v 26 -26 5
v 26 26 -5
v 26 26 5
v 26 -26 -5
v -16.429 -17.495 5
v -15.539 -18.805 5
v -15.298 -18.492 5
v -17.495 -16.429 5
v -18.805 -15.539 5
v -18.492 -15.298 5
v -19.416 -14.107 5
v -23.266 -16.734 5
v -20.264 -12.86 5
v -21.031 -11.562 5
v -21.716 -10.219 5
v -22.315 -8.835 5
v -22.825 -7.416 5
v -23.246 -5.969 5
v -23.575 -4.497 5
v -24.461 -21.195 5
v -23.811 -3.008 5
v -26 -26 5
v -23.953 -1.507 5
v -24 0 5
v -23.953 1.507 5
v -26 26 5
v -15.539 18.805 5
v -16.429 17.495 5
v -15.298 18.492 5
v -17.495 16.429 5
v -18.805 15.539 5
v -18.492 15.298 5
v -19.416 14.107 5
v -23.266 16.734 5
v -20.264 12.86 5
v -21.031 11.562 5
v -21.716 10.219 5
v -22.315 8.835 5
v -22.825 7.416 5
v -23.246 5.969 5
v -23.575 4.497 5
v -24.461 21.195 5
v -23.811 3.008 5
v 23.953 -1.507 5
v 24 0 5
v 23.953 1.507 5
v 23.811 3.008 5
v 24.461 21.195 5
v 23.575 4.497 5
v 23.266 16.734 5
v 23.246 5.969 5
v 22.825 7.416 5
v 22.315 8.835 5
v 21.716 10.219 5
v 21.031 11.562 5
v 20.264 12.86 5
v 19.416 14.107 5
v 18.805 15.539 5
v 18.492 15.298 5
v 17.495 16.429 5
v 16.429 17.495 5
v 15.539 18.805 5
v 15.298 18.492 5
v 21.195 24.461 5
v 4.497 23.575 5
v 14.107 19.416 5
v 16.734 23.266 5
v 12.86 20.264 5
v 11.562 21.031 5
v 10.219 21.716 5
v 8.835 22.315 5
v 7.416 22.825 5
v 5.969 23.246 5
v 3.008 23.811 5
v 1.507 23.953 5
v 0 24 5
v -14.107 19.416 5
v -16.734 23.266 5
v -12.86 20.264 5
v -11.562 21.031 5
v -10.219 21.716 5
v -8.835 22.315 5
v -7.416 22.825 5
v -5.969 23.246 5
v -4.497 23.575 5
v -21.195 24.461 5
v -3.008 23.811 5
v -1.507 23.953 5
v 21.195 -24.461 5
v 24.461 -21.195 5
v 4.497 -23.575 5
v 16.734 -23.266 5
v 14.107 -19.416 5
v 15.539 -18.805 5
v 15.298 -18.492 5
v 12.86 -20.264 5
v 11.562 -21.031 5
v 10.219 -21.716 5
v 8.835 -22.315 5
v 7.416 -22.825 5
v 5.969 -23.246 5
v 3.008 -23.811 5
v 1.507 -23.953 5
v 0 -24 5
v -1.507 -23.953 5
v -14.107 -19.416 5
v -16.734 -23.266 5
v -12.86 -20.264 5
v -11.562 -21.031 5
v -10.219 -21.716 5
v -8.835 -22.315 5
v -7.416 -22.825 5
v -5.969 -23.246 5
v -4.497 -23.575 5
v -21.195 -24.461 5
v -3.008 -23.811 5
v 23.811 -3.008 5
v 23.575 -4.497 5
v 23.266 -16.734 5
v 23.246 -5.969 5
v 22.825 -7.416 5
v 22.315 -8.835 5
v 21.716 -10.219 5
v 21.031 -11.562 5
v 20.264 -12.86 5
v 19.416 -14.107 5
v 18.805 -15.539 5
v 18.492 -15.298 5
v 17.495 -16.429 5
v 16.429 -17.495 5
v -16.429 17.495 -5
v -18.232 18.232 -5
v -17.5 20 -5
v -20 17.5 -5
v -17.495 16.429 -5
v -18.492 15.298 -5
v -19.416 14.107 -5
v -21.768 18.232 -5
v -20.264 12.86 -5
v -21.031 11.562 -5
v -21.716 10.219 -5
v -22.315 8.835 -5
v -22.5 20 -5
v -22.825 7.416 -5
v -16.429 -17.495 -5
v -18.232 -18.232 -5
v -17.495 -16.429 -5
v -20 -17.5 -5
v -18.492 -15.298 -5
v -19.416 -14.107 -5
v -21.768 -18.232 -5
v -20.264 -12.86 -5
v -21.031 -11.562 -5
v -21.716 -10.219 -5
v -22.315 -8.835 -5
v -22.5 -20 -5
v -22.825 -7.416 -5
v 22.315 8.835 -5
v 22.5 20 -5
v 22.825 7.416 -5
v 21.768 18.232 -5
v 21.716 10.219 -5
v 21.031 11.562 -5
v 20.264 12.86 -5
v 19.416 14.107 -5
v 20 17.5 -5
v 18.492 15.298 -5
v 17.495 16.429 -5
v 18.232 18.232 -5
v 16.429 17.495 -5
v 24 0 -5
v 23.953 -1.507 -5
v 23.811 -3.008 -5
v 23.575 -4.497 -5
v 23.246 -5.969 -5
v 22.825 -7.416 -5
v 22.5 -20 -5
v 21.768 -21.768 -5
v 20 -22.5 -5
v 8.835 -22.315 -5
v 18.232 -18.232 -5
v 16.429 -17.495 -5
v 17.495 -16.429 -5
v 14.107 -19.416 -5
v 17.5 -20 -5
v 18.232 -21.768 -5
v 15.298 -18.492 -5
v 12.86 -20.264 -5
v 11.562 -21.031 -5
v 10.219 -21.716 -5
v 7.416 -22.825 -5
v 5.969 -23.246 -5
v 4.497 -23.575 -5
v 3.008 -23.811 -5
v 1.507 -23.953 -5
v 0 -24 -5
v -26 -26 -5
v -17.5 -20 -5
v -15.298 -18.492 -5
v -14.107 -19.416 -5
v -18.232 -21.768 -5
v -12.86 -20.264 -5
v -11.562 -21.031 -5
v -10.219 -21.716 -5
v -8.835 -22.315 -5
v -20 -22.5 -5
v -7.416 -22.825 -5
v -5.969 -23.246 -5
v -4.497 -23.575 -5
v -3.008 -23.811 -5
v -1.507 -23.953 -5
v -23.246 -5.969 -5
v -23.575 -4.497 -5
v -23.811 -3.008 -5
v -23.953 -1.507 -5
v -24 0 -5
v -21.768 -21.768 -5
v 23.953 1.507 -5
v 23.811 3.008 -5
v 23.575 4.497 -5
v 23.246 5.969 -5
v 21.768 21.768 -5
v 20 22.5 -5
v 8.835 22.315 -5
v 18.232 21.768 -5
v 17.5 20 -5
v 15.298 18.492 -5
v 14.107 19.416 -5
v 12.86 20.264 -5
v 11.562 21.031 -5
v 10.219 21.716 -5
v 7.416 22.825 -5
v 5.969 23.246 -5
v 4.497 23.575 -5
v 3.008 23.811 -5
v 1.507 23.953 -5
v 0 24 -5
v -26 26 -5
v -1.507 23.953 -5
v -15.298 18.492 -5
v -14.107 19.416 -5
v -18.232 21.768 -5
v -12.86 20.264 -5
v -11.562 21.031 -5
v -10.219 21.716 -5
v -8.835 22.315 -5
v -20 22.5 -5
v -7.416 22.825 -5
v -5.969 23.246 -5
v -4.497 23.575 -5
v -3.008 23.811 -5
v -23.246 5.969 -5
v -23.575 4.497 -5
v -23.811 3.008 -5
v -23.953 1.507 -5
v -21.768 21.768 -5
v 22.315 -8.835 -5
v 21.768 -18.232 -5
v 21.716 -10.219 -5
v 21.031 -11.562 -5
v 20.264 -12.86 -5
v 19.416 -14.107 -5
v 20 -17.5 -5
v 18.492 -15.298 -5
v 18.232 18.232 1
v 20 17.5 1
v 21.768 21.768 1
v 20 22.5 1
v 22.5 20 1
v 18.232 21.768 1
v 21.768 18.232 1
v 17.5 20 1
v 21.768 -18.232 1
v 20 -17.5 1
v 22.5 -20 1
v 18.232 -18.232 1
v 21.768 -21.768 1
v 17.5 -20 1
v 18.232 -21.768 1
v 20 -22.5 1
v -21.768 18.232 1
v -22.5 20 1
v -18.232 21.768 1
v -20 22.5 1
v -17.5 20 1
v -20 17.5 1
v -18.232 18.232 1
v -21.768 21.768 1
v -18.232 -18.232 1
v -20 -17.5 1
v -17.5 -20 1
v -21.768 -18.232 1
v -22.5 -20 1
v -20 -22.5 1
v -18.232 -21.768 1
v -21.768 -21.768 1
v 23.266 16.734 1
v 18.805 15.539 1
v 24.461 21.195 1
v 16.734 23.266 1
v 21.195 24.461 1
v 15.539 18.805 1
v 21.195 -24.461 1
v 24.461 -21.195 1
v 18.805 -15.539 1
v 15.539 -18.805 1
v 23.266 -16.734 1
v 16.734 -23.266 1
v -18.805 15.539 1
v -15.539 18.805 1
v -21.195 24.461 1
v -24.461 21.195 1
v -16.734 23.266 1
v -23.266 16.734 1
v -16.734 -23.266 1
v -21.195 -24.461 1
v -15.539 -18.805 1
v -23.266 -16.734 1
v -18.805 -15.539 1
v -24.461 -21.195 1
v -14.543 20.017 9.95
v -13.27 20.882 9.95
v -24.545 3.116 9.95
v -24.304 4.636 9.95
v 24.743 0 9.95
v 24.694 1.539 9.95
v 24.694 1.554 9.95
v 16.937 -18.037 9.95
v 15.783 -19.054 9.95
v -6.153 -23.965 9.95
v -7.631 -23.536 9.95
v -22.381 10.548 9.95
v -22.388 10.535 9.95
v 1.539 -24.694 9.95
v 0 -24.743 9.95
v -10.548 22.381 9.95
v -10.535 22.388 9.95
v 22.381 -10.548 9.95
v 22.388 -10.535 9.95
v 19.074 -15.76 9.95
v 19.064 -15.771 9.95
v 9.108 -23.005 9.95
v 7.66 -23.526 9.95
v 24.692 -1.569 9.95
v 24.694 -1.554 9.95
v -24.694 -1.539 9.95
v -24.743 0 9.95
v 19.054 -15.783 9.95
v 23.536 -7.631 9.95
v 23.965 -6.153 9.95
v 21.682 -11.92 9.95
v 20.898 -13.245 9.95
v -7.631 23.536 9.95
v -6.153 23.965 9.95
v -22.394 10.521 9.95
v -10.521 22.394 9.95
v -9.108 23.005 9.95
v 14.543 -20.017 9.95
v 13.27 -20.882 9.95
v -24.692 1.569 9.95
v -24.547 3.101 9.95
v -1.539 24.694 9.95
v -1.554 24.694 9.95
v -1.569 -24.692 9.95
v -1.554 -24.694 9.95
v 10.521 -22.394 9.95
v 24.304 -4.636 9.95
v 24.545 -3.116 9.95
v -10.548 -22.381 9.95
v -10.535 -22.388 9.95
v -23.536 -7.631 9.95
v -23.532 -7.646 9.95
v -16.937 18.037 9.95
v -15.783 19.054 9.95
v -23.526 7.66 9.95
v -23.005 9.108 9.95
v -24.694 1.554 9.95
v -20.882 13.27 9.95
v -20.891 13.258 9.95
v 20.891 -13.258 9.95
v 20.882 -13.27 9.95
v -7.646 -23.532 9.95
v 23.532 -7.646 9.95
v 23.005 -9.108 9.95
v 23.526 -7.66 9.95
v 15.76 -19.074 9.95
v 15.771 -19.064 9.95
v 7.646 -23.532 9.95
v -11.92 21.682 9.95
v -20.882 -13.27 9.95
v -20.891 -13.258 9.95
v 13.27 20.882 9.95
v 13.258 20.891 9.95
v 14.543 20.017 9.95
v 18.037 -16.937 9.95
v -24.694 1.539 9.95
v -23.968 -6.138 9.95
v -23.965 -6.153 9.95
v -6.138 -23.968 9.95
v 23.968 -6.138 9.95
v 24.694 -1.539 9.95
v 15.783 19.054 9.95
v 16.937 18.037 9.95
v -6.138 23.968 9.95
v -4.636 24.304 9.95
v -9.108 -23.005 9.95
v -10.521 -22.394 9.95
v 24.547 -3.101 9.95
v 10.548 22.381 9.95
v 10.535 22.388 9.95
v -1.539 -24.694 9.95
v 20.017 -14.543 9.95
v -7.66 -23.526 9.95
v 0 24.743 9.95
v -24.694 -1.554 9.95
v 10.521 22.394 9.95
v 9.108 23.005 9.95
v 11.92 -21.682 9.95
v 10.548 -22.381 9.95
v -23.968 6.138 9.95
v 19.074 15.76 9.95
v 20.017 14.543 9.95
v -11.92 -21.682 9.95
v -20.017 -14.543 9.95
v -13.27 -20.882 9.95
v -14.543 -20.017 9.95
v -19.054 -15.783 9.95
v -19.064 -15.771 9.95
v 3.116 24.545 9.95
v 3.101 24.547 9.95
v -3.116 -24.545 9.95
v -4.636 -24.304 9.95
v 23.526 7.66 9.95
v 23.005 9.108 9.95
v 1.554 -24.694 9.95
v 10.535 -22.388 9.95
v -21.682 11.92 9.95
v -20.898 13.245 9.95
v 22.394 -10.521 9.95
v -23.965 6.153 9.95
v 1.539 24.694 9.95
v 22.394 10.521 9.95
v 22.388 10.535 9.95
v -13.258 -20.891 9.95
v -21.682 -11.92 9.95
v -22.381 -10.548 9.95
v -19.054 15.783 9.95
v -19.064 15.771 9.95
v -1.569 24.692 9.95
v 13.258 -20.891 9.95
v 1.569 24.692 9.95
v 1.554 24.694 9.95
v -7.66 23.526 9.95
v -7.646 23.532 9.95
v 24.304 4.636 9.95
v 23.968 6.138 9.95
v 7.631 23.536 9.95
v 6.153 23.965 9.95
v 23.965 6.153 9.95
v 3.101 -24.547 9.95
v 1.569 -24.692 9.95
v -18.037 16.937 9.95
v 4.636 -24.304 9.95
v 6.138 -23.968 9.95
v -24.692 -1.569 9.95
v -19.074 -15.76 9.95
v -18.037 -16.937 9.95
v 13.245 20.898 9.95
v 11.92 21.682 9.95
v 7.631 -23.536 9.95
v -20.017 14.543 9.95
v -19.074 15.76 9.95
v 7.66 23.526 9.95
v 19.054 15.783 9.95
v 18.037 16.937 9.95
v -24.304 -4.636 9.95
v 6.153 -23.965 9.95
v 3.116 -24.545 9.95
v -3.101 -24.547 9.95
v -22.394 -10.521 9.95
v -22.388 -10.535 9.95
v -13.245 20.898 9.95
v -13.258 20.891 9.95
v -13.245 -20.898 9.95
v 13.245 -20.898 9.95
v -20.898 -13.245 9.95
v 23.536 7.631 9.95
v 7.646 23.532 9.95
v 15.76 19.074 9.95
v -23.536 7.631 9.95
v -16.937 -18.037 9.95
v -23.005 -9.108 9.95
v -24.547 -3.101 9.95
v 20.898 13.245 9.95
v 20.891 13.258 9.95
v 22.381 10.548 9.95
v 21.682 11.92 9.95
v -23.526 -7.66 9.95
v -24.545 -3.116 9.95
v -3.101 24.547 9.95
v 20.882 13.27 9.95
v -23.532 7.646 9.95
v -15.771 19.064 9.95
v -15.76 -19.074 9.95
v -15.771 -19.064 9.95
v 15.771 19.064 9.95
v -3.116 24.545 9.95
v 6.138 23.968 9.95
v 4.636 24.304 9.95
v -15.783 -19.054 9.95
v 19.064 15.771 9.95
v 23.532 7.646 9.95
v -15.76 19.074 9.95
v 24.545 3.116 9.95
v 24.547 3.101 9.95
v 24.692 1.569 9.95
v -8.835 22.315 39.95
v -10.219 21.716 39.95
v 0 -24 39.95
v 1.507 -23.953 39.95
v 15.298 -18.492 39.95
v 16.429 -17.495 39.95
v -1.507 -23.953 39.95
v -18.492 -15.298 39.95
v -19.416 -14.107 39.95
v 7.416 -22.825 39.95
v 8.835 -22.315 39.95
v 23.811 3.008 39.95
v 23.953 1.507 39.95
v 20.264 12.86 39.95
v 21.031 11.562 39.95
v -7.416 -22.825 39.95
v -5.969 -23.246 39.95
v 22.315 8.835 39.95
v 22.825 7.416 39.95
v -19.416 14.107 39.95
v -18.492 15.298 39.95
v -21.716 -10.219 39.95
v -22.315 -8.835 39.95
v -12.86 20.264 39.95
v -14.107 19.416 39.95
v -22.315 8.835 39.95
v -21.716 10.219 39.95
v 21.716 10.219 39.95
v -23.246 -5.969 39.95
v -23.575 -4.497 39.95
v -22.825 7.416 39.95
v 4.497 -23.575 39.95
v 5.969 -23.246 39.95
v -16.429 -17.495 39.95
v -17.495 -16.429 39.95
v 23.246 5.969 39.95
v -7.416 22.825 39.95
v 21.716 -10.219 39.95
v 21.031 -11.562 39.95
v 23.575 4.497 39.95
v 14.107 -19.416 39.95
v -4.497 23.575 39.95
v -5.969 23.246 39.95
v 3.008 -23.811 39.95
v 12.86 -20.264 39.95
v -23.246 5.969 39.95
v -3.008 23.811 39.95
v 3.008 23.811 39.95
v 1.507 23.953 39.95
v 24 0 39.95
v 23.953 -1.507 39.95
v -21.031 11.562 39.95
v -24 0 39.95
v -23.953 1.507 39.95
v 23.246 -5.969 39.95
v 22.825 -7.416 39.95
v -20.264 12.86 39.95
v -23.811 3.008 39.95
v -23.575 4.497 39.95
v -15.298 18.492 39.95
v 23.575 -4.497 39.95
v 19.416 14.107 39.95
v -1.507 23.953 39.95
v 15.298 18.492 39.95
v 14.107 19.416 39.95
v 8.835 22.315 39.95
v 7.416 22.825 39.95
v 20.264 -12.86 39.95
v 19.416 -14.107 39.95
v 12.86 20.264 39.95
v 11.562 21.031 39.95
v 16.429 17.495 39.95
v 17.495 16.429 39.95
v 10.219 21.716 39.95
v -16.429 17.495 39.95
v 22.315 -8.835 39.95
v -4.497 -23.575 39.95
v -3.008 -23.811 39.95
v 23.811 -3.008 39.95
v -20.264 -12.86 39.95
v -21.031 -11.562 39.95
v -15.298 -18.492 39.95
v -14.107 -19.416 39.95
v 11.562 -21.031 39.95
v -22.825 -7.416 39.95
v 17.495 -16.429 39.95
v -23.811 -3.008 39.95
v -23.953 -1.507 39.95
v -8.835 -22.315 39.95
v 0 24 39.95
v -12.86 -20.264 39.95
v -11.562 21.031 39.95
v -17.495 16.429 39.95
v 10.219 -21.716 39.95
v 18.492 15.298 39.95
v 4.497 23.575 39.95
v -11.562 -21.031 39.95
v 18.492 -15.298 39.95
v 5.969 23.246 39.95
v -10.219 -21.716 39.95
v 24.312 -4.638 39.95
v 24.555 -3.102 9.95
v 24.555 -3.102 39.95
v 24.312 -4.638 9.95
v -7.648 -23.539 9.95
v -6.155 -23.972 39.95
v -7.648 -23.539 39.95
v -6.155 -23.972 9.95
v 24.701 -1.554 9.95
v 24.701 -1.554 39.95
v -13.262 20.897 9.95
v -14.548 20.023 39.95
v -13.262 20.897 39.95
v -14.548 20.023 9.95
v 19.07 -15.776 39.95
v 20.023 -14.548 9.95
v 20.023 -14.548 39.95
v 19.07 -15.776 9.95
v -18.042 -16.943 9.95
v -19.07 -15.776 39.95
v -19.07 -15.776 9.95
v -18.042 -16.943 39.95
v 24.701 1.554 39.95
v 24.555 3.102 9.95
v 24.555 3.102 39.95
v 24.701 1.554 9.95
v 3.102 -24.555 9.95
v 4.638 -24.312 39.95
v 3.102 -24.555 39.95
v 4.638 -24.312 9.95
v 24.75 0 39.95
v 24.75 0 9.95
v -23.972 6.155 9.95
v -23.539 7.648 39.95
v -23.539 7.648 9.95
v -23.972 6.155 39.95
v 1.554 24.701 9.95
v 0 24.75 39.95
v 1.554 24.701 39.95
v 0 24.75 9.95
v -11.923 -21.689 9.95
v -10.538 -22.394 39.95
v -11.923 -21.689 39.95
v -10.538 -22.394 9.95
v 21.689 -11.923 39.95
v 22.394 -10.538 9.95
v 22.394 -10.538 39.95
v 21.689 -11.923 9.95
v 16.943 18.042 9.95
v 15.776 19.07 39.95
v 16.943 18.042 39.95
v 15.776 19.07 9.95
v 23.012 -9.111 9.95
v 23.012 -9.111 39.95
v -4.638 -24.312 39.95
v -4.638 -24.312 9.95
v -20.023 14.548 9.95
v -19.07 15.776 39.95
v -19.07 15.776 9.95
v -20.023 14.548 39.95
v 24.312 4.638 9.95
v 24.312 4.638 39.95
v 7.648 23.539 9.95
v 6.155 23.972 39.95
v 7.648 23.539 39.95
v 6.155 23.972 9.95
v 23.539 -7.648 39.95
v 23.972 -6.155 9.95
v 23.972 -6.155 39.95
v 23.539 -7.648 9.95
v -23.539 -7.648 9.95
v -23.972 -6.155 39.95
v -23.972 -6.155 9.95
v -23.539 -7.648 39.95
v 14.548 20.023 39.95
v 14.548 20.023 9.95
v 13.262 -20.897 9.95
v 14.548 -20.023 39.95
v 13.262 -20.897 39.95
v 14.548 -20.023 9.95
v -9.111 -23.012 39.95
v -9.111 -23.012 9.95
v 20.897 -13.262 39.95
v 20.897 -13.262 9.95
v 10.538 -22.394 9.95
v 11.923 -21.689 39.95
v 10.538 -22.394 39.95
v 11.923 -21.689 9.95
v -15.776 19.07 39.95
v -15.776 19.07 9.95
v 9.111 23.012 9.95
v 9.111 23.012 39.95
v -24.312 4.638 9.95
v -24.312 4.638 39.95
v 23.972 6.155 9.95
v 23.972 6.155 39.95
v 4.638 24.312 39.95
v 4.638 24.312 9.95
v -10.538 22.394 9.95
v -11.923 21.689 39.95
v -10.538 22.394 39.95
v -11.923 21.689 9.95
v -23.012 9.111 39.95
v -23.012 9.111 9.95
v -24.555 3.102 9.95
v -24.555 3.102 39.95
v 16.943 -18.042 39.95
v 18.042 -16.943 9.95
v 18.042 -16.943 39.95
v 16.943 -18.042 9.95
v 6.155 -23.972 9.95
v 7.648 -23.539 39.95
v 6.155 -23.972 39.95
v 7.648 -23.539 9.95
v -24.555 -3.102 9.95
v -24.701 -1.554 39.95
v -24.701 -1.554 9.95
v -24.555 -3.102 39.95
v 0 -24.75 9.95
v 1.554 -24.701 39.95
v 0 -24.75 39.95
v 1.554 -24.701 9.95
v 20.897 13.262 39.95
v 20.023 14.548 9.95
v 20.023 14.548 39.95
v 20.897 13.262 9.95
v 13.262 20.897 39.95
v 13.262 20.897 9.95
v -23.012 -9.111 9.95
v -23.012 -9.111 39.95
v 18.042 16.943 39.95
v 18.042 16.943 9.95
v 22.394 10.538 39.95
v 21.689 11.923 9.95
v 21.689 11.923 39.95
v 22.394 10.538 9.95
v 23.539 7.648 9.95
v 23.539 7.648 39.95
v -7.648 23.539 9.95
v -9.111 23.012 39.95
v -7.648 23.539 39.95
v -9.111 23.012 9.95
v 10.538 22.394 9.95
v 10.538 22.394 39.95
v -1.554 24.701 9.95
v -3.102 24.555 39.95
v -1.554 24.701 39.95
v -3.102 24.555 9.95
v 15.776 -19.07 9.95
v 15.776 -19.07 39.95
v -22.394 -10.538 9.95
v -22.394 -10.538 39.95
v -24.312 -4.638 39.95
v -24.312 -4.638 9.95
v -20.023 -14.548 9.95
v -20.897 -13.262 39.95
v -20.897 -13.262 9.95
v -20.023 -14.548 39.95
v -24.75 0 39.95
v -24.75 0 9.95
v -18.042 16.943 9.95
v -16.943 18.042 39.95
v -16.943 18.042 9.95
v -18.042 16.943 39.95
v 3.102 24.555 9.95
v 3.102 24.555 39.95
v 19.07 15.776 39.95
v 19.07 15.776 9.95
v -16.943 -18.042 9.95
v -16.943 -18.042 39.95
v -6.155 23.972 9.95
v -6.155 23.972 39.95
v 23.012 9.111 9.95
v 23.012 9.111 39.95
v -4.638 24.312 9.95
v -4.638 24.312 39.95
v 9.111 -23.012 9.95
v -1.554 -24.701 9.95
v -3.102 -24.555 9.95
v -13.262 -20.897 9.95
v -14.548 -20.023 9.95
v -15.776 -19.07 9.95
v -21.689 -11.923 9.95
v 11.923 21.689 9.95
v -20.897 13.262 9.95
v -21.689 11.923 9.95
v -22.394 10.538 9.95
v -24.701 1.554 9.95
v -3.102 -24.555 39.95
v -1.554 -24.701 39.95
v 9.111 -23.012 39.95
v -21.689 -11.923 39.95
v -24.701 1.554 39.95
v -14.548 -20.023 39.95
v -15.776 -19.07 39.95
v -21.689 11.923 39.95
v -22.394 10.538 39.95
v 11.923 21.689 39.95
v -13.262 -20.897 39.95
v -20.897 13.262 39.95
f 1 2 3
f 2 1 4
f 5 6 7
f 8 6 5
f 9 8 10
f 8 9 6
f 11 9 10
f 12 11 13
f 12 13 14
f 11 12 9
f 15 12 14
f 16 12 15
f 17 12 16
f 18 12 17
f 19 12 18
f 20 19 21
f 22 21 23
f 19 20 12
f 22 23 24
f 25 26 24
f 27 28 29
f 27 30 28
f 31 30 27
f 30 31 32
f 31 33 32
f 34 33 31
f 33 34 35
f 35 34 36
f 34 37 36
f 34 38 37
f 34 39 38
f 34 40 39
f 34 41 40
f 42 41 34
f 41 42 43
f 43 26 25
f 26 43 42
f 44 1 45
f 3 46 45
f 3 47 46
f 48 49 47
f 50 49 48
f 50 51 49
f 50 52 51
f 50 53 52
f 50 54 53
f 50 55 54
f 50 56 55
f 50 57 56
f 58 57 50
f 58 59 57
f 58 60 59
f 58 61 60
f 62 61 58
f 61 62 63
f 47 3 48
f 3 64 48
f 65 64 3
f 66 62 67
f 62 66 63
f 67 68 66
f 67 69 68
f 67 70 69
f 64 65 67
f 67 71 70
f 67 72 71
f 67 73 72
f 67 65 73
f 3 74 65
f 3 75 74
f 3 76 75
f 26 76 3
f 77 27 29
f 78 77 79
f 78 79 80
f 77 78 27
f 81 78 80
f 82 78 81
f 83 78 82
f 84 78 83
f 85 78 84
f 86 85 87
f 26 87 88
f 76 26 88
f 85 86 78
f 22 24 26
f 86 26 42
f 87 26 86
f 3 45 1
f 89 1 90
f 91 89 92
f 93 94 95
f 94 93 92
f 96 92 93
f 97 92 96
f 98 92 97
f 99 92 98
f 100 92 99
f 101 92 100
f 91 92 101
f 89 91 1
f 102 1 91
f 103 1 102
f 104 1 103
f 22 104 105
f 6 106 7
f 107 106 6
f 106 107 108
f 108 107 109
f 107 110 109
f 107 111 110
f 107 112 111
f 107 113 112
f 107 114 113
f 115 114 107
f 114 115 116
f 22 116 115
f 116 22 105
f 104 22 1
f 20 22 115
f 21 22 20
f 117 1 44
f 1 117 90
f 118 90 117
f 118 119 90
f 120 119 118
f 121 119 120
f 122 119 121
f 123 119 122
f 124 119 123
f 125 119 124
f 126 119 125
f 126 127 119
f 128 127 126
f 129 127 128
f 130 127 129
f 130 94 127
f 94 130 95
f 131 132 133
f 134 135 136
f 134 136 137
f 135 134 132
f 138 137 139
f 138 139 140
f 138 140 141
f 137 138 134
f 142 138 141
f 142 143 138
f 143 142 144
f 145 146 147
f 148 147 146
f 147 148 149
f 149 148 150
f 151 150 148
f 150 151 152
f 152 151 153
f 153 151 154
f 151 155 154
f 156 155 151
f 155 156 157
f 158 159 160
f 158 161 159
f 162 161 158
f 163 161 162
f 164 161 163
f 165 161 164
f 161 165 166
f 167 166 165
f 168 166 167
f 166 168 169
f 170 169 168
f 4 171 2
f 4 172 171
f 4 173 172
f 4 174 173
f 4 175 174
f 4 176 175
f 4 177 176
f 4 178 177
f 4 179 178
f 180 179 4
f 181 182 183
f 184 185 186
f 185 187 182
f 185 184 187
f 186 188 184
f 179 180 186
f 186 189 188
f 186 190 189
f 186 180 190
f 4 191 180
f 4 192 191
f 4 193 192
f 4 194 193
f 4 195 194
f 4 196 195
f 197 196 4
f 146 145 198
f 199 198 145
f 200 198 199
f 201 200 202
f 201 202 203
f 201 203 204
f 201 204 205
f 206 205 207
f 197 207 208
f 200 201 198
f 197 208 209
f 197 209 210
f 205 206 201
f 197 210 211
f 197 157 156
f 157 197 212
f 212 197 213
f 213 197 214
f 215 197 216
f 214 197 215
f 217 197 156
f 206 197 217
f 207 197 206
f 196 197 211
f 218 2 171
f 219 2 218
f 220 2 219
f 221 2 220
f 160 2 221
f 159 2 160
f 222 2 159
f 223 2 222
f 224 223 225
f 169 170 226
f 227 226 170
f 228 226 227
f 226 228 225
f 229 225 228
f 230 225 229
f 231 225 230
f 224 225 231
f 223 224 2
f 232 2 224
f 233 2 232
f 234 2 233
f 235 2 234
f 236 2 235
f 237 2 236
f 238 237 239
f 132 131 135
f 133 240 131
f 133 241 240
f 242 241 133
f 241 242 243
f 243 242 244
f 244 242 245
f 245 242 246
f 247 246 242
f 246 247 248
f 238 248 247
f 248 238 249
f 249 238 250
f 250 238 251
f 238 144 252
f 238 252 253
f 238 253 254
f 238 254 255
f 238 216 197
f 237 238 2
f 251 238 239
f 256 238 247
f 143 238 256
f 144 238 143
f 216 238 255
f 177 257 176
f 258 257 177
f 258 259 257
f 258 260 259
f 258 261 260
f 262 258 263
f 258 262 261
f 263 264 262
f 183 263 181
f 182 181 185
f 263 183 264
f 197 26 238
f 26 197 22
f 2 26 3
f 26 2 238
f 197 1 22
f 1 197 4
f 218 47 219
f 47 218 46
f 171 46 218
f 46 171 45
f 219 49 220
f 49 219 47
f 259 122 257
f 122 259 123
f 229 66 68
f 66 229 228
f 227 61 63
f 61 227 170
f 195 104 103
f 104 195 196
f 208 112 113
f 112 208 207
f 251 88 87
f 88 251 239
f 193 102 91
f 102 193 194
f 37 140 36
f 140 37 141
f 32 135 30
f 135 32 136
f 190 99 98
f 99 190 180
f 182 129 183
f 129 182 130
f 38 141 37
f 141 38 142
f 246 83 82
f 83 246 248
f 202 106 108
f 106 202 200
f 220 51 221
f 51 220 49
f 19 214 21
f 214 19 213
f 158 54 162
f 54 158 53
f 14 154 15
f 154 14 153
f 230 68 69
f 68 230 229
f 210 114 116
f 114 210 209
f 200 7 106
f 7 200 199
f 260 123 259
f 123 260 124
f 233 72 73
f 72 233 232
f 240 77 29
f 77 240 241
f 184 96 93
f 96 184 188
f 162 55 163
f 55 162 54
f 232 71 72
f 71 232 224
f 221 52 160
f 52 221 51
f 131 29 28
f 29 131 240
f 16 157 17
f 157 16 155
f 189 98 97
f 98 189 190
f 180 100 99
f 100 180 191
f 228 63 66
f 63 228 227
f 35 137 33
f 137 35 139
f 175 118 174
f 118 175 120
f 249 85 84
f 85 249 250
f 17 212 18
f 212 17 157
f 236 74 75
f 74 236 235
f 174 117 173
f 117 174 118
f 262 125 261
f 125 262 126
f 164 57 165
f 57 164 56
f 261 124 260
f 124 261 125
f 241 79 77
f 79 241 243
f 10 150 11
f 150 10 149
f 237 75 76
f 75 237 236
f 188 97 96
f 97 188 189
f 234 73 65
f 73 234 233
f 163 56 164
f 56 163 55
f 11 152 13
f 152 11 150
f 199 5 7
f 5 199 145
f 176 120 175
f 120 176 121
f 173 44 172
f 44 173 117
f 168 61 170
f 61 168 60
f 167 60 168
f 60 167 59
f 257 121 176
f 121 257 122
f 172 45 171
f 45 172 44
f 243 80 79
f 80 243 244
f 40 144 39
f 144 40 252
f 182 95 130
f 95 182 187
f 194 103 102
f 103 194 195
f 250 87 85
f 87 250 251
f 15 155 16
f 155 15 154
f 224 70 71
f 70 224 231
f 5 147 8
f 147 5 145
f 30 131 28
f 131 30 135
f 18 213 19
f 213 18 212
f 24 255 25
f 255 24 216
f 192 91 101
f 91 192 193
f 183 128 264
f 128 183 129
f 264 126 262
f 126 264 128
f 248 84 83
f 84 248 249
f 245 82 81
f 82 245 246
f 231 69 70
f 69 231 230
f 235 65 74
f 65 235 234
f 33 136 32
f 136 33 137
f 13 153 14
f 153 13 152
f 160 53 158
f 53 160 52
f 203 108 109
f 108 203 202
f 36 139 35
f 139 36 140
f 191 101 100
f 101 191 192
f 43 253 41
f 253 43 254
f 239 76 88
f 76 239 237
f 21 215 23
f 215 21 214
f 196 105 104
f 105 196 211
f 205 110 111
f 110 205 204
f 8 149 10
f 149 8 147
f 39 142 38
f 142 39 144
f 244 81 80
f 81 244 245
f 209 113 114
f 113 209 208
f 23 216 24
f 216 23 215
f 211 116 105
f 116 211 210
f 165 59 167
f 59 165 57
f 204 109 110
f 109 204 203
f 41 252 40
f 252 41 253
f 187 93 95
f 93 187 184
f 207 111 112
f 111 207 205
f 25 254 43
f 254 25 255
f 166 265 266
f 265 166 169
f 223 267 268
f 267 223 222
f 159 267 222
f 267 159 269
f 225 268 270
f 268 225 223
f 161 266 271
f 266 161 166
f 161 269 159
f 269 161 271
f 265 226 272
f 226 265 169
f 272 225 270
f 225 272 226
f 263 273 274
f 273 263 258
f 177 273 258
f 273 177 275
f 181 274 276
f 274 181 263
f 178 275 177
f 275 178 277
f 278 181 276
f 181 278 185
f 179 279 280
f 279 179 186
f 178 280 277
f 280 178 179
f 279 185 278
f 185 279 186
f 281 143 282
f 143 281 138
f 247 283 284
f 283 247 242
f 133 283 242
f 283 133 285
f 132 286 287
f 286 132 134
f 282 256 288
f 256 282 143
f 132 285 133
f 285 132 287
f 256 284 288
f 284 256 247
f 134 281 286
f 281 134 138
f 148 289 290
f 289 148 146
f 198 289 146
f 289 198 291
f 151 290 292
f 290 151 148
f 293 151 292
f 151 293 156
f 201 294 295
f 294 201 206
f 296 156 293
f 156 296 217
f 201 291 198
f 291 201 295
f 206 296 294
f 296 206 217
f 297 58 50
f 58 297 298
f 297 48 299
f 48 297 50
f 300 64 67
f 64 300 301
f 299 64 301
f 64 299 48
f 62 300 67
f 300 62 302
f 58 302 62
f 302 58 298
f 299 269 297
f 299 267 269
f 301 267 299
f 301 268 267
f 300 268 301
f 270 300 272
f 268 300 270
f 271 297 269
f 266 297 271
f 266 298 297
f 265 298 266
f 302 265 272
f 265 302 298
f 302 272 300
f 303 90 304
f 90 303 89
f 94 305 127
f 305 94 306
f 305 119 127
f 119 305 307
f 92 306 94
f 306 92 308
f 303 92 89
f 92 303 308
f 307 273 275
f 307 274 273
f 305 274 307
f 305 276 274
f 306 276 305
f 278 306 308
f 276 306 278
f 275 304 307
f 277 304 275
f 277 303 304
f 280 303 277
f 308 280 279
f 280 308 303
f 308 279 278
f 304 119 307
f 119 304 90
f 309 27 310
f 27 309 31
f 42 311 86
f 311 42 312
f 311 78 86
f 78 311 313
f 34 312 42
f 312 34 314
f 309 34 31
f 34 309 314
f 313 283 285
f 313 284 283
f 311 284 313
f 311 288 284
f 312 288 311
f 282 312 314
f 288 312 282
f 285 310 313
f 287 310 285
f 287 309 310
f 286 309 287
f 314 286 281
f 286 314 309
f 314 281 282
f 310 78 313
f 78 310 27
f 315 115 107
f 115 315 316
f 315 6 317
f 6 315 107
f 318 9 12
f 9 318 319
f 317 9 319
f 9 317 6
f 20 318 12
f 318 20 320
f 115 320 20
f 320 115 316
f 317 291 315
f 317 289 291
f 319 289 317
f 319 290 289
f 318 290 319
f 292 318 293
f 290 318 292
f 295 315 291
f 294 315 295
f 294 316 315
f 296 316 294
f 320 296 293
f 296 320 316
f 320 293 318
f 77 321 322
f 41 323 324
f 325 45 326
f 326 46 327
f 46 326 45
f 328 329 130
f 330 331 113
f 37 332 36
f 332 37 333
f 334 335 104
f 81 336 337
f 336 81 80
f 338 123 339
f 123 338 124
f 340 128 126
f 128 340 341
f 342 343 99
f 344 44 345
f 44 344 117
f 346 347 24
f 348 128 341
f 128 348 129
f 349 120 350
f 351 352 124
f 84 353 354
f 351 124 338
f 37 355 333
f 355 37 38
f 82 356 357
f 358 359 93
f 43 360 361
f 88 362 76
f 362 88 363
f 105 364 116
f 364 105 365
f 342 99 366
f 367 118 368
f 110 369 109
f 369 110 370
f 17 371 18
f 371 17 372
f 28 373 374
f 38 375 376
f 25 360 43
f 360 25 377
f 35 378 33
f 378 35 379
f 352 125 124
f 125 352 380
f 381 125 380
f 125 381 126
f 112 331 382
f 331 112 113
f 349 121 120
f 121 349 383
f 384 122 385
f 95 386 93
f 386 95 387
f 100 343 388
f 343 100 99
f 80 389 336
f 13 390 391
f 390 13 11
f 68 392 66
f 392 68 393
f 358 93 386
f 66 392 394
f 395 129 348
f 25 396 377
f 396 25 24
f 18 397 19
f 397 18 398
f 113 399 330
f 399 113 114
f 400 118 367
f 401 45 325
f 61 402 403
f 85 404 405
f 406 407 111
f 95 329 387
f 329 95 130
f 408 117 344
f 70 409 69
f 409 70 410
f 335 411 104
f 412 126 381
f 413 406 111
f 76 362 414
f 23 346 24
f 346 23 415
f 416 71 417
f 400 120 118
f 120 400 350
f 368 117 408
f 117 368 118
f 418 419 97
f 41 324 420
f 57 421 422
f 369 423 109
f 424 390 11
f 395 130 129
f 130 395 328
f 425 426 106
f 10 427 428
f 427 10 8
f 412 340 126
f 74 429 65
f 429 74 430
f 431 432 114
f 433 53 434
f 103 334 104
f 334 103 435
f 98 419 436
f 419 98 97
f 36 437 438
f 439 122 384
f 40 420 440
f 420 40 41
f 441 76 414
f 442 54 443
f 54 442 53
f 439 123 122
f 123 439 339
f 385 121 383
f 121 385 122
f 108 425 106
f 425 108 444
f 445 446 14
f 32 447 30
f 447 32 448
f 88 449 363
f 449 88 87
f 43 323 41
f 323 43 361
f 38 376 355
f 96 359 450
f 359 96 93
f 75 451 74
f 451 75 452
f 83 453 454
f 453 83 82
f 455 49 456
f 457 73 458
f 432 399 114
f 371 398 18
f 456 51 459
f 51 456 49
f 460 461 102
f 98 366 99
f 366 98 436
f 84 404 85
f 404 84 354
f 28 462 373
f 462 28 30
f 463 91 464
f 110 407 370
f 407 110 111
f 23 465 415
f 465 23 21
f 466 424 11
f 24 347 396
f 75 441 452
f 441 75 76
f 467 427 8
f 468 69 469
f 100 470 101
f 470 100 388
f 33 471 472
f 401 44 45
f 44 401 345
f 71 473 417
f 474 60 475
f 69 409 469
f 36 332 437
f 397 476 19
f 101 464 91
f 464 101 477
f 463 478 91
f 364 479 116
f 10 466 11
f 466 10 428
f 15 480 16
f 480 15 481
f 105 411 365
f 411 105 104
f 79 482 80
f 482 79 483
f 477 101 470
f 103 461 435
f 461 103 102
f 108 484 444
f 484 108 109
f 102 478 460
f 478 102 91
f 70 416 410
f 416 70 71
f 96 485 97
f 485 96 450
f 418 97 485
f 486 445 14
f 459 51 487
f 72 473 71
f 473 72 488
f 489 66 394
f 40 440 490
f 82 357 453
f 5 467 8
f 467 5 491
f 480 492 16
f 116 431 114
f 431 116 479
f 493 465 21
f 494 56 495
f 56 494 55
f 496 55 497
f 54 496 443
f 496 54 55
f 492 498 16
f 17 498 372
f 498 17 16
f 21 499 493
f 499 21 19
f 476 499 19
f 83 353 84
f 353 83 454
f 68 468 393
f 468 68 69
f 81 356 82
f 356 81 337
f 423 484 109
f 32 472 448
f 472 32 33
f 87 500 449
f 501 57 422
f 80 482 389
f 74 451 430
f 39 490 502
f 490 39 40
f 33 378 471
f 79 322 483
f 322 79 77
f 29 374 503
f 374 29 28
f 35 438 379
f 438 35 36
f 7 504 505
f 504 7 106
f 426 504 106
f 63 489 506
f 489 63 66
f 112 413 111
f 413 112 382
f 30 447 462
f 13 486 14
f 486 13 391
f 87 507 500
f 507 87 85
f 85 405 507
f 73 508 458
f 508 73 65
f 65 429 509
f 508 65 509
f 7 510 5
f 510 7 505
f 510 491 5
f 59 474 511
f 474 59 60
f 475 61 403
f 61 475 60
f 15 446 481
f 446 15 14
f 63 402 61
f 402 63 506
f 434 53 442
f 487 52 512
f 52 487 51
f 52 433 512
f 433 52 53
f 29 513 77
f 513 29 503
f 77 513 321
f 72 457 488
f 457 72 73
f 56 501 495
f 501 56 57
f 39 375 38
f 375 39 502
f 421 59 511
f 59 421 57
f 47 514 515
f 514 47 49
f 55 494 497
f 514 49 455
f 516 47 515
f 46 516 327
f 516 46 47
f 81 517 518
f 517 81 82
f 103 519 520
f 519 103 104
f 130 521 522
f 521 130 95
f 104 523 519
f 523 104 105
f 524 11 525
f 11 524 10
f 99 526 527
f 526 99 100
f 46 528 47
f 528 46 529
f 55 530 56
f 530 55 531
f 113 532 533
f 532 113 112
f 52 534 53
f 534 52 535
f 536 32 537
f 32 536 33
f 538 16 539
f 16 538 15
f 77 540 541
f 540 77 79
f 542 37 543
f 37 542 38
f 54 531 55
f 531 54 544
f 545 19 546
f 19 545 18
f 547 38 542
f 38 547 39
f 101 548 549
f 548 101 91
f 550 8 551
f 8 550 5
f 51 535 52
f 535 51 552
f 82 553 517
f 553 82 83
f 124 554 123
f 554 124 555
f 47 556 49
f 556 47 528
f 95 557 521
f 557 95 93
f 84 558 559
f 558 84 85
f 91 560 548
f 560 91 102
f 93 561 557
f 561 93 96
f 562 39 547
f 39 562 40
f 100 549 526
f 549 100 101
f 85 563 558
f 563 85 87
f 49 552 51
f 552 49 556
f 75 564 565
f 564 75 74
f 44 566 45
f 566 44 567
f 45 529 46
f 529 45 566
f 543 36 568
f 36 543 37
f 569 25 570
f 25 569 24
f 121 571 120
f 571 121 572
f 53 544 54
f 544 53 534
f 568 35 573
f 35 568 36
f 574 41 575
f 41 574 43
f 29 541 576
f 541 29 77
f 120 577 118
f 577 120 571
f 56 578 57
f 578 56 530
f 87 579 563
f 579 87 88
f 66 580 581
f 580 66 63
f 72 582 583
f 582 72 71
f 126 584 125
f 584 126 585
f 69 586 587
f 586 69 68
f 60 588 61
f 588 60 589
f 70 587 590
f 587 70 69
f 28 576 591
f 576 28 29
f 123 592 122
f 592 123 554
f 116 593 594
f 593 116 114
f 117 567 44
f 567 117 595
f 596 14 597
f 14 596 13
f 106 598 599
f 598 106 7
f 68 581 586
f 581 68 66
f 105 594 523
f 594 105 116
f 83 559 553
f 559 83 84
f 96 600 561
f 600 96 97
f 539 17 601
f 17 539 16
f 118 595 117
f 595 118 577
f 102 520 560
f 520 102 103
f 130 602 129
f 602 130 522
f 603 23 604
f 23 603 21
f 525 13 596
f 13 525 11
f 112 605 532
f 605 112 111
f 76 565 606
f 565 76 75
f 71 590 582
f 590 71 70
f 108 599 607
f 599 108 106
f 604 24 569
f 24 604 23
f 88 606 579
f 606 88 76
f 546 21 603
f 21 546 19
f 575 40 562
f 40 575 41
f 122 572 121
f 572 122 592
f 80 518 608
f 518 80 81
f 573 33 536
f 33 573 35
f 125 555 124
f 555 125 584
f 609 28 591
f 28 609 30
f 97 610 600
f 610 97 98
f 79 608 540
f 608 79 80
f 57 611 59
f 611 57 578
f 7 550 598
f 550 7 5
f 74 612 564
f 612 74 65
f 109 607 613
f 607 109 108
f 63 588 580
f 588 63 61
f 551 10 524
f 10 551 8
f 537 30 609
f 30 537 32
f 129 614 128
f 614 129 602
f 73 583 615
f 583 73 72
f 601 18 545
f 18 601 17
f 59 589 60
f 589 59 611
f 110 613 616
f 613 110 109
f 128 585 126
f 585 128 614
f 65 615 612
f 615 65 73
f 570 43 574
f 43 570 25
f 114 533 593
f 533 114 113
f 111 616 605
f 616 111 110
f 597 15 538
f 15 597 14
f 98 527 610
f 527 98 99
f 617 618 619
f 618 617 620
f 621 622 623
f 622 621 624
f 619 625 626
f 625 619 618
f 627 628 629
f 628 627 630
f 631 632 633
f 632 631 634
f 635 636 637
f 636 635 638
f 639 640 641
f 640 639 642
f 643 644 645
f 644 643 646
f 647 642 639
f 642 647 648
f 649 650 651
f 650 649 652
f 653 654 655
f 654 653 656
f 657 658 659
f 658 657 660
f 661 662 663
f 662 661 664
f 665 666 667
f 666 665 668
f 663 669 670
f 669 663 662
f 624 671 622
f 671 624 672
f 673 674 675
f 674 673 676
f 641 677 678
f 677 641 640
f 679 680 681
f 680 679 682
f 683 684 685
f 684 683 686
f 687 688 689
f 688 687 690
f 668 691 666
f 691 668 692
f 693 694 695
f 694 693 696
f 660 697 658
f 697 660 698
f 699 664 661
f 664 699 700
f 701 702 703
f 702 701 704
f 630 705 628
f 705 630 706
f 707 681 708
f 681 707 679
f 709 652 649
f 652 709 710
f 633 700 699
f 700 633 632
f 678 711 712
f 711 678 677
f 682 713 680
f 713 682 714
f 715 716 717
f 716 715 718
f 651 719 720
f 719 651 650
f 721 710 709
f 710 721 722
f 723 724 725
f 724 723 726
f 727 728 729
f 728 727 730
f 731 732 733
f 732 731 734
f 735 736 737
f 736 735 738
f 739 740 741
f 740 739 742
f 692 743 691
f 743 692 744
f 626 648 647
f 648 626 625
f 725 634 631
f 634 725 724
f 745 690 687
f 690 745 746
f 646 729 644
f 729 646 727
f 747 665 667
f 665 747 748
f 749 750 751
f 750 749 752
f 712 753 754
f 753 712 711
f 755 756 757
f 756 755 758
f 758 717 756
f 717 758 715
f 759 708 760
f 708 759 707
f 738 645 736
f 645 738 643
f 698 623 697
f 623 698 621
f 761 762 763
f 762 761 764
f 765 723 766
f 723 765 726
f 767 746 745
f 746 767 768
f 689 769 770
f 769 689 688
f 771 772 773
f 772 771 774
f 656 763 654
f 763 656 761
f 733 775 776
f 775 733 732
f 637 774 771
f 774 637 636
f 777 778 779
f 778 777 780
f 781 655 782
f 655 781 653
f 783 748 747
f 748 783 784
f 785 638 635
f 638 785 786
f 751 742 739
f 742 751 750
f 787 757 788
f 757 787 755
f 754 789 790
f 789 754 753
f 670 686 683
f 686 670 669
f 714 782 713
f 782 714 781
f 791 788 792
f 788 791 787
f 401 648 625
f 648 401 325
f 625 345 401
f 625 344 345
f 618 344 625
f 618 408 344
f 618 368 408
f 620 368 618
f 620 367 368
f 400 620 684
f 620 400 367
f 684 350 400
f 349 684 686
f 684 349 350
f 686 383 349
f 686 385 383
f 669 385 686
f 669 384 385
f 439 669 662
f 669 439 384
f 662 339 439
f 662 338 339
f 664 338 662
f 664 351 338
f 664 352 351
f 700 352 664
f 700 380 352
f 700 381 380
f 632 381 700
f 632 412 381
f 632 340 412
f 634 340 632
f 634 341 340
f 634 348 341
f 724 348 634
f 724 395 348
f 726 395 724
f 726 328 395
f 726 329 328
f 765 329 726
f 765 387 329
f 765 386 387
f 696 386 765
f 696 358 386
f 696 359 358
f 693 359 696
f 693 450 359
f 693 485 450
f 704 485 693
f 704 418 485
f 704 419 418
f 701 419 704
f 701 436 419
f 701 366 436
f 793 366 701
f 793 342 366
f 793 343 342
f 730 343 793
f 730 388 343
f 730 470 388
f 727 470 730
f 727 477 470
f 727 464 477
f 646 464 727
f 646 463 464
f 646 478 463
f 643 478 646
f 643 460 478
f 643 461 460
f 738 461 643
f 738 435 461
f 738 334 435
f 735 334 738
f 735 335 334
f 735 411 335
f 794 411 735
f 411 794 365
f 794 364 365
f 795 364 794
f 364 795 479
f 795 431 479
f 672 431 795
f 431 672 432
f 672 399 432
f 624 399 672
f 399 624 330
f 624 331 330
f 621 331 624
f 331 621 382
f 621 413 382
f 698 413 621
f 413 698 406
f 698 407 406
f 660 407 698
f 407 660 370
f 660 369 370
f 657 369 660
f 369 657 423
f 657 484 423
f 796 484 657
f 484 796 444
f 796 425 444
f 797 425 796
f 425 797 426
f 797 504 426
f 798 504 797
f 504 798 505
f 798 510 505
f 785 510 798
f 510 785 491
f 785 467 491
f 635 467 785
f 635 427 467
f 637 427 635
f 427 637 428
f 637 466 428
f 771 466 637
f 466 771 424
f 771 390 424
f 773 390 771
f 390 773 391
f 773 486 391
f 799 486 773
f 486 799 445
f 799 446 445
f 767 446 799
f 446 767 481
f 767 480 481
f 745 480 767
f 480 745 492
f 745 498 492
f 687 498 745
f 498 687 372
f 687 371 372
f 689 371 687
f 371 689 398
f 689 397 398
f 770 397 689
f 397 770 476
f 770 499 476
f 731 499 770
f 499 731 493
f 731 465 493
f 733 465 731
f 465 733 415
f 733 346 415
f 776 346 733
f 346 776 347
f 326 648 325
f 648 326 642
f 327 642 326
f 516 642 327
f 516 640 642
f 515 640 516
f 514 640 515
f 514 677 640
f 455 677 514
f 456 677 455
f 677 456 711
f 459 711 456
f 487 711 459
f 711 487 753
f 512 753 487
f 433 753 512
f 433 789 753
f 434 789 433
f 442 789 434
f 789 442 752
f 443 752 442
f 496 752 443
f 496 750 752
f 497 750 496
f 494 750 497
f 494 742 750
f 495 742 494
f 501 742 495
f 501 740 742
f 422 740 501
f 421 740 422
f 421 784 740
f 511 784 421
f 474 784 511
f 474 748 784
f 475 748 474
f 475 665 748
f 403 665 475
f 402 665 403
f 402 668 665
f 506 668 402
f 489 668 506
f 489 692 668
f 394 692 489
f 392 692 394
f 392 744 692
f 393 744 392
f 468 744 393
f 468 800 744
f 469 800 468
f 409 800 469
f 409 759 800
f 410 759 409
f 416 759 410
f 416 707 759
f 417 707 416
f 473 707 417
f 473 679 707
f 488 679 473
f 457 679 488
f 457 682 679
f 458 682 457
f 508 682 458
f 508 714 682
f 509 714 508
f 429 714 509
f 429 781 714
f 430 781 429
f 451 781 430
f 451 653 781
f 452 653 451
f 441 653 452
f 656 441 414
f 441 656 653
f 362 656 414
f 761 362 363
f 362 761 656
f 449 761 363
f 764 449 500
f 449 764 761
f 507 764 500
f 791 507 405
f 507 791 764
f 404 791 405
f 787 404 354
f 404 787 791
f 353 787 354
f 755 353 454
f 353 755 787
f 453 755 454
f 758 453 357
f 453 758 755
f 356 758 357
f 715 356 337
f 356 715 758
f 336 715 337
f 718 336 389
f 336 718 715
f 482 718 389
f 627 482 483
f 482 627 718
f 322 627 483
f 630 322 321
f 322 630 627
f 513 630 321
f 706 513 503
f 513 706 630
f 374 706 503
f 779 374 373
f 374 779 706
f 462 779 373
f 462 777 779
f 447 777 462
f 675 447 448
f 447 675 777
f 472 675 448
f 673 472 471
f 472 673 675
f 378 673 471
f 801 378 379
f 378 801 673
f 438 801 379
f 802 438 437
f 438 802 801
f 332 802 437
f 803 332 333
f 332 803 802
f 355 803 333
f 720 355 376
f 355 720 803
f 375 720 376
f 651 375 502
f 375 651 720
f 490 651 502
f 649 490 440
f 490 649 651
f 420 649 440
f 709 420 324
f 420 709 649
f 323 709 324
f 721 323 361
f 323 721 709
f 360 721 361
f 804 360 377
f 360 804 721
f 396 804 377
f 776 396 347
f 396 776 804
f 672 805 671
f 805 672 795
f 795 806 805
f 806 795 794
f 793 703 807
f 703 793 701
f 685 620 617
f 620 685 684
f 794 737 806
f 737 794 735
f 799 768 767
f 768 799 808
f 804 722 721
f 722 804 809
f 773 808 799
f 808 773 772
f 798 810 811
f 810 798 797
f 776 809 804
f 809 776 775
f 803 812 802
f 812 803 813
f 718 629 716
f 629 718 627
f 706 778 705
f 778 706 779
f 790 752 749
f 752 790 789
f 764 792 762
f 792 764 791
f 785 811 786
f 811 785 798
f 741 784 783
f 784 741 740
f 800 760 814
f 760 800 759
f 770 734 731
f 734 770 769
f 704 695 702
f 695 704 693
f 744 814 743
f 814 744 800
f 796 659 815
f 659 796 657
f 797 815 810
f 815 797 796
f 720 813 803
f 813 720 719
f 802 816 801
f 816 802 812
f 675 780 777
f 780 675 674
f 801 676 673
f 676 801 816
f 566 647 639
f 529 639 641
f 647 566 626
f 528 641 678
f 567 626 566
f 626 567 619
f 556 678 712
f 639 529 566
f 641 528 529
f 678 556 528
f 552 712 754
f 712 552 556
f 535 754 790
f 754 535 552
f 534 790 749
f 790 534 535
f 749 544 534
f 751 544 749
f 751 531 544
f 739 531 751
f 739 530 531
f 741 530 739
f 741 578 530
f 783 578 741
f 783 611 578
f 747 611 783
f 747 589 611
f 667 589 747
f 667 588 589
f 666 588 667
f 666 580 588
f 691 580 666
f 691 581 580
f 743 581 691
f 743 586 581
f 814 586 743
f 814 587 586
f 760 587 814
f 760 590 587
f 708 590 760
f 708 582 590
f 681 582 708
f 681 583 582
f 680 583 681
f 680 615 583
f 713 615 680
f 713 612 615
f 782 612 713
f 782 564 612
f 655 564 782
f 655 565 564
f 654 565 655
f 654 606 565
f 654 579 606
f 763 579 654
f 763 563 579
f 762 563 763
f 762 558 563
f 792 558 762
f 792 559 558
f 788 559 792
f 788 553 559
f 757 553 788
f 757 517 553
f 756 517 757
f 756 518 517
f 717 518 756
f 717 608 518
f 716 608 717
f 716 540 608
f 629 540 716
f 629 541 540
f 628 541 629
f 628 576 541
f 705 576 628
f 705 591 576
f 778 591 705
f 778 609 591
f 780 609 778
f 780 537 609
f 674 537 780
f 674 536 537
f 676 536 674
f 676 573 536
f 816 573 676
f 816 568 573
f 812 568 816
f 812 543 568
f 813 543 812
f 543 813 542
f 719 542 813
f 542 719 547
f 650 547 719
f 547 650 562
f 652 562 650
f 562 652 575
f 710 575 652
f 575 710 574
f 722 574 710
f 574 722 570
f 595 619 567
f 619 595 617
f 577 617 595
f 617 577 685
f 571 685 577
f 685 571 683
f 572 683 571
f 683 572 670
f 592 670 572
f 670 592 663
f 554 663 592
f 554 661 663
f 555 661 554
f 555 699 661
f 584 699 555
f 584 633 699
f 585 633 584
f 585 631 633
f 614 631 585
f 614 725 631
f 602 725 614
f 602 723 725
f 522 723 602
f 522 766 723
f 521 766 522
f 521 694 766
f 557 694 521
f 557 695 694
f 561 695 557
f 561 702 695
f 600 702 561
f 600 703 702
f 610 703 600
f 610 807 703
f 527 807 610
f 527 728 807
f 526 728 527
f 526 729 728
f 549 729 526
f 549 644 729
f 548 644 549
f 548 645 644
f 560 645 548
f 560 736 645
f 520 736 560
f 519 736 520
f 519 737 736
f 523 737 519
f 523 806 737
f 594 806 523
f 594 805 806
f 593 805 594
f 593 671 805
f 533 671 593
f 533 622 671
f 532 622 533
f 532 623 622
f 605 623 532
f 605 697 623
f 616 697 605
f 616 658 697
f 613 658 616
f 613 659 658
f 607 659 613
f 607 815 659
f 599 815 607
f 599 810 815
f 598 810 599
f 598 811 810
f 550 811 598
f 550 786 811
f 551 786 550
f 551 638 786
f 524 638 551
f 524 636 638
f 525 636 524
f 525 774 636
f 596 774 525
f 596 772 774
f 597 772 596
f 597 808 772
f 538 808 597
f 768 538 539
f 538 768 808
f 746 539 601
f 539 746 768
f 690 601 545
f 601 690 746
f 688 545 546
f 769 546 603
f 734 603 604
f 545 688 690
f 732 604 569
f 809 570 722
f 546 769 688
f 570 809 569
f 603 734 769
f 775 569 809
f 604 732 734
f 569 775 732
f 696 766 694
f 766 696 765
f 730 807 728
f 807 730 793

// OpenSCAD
cube_x = 52; //Width of the base
cube_y = 52; //Length of the base
cube_z = 10; //Height of the base
hole_size = 49.5;  //The diameter of the hole on the box itself
fan_diameter = 48; //The diameter of the fan blade

cone_height = 5; //Height of the cone part
cylinder_height = 30; //Height of the straight pipe part
screw_z_offset = -1*(cube_z+1)/2; //Z offset for the screw holes
edge_length_hex = 4; //The intended length from the center to an edge
adjusted_radius = edge_length_hex * 2 / sqrt(3); //The adjusted 'cylinder' radius so the center to edge will be the edge_length_hex
nut_height = 4; //The height of the nut
wall_thickness = 2;

union() {
    //The cube base and the screw holes
    difference() {
        cube([cube_x,cube_y,cube_z], center=true); //Base cube
        cylinder(cube_z+1,d=fan_diameter, center = true, $fn=100); //Fan cutout
        
        //Screw cutouts
        translate([20,20,screw_z_offset]){
            cylinder(cube_z+1,d=5);
        }
        translate([20,-20,screw_z_offset]){
            cylinder(cube_z+1,d=5);
        }
        translate([-20,20,screw_z_offset]){
            cylinder(cube_z+1,d=5);
        }
        translate([-20,-20,screw_z_offset]){
            cylinder(cube_z+1,d=5);
        }
        
        //The nut holes
        translate([20, 20,cube_z/2 - nut_height]){
            rotate([0,0,15]){
                cylinder(r=adjusted_radius, h=nut_height + 0.1, $fn=6);
            }
        }
        translate([20, -20,cube_z/2 - nut_height]){
            rotate([0,0,45]){
                cylinder(r=adjusted_radius, h=nut_height + 0.1, $fn=6);
            }
        }
        translate([-20, 20,cube_z/2 - nut_height]){
            rotate([0,0,45]){
                cylinder(r=adjusted_radius, h=nut_height + 0.1, $fn=6);
            }
        }
        translate([-20, -20,cube_z/2 - nut_height]){
            rotate([0,0,15]){
                cylinder(r=adjusted_radius, h=nut_height + 0.1, $fn=6);
            }
        }
    }
    //Inverse cone section
    //We only have this section because without it, the nut holes would be partially covered 
    difference(){
        translate([0, 0, cube_z/2]){
            cylinder(cone_height, r1 = 24, r2 = hole_size/2, $fn=100);
        }
        
        translate([0, 0, cube_z/2 - 0.1]){
            cylinder(cone_height + 1, d = hole_size - wall_thickness+0.5, $fn=100);
        }
    }
    
    //Straight pipe section
    difference(){
        translate([0, 0, cone_height + cube_z/2 - 0.05]){
            cylinder(cylinder_height, d = hole_size, $fn=100);
        }
        
        translate([0, 0, cone_height + cube_z/2 - 0.15]){
            cylinder(cylinder_height + 0.2, d = hole_size - wall_thickness+0.5, $fn=100);
        }
    }
}
